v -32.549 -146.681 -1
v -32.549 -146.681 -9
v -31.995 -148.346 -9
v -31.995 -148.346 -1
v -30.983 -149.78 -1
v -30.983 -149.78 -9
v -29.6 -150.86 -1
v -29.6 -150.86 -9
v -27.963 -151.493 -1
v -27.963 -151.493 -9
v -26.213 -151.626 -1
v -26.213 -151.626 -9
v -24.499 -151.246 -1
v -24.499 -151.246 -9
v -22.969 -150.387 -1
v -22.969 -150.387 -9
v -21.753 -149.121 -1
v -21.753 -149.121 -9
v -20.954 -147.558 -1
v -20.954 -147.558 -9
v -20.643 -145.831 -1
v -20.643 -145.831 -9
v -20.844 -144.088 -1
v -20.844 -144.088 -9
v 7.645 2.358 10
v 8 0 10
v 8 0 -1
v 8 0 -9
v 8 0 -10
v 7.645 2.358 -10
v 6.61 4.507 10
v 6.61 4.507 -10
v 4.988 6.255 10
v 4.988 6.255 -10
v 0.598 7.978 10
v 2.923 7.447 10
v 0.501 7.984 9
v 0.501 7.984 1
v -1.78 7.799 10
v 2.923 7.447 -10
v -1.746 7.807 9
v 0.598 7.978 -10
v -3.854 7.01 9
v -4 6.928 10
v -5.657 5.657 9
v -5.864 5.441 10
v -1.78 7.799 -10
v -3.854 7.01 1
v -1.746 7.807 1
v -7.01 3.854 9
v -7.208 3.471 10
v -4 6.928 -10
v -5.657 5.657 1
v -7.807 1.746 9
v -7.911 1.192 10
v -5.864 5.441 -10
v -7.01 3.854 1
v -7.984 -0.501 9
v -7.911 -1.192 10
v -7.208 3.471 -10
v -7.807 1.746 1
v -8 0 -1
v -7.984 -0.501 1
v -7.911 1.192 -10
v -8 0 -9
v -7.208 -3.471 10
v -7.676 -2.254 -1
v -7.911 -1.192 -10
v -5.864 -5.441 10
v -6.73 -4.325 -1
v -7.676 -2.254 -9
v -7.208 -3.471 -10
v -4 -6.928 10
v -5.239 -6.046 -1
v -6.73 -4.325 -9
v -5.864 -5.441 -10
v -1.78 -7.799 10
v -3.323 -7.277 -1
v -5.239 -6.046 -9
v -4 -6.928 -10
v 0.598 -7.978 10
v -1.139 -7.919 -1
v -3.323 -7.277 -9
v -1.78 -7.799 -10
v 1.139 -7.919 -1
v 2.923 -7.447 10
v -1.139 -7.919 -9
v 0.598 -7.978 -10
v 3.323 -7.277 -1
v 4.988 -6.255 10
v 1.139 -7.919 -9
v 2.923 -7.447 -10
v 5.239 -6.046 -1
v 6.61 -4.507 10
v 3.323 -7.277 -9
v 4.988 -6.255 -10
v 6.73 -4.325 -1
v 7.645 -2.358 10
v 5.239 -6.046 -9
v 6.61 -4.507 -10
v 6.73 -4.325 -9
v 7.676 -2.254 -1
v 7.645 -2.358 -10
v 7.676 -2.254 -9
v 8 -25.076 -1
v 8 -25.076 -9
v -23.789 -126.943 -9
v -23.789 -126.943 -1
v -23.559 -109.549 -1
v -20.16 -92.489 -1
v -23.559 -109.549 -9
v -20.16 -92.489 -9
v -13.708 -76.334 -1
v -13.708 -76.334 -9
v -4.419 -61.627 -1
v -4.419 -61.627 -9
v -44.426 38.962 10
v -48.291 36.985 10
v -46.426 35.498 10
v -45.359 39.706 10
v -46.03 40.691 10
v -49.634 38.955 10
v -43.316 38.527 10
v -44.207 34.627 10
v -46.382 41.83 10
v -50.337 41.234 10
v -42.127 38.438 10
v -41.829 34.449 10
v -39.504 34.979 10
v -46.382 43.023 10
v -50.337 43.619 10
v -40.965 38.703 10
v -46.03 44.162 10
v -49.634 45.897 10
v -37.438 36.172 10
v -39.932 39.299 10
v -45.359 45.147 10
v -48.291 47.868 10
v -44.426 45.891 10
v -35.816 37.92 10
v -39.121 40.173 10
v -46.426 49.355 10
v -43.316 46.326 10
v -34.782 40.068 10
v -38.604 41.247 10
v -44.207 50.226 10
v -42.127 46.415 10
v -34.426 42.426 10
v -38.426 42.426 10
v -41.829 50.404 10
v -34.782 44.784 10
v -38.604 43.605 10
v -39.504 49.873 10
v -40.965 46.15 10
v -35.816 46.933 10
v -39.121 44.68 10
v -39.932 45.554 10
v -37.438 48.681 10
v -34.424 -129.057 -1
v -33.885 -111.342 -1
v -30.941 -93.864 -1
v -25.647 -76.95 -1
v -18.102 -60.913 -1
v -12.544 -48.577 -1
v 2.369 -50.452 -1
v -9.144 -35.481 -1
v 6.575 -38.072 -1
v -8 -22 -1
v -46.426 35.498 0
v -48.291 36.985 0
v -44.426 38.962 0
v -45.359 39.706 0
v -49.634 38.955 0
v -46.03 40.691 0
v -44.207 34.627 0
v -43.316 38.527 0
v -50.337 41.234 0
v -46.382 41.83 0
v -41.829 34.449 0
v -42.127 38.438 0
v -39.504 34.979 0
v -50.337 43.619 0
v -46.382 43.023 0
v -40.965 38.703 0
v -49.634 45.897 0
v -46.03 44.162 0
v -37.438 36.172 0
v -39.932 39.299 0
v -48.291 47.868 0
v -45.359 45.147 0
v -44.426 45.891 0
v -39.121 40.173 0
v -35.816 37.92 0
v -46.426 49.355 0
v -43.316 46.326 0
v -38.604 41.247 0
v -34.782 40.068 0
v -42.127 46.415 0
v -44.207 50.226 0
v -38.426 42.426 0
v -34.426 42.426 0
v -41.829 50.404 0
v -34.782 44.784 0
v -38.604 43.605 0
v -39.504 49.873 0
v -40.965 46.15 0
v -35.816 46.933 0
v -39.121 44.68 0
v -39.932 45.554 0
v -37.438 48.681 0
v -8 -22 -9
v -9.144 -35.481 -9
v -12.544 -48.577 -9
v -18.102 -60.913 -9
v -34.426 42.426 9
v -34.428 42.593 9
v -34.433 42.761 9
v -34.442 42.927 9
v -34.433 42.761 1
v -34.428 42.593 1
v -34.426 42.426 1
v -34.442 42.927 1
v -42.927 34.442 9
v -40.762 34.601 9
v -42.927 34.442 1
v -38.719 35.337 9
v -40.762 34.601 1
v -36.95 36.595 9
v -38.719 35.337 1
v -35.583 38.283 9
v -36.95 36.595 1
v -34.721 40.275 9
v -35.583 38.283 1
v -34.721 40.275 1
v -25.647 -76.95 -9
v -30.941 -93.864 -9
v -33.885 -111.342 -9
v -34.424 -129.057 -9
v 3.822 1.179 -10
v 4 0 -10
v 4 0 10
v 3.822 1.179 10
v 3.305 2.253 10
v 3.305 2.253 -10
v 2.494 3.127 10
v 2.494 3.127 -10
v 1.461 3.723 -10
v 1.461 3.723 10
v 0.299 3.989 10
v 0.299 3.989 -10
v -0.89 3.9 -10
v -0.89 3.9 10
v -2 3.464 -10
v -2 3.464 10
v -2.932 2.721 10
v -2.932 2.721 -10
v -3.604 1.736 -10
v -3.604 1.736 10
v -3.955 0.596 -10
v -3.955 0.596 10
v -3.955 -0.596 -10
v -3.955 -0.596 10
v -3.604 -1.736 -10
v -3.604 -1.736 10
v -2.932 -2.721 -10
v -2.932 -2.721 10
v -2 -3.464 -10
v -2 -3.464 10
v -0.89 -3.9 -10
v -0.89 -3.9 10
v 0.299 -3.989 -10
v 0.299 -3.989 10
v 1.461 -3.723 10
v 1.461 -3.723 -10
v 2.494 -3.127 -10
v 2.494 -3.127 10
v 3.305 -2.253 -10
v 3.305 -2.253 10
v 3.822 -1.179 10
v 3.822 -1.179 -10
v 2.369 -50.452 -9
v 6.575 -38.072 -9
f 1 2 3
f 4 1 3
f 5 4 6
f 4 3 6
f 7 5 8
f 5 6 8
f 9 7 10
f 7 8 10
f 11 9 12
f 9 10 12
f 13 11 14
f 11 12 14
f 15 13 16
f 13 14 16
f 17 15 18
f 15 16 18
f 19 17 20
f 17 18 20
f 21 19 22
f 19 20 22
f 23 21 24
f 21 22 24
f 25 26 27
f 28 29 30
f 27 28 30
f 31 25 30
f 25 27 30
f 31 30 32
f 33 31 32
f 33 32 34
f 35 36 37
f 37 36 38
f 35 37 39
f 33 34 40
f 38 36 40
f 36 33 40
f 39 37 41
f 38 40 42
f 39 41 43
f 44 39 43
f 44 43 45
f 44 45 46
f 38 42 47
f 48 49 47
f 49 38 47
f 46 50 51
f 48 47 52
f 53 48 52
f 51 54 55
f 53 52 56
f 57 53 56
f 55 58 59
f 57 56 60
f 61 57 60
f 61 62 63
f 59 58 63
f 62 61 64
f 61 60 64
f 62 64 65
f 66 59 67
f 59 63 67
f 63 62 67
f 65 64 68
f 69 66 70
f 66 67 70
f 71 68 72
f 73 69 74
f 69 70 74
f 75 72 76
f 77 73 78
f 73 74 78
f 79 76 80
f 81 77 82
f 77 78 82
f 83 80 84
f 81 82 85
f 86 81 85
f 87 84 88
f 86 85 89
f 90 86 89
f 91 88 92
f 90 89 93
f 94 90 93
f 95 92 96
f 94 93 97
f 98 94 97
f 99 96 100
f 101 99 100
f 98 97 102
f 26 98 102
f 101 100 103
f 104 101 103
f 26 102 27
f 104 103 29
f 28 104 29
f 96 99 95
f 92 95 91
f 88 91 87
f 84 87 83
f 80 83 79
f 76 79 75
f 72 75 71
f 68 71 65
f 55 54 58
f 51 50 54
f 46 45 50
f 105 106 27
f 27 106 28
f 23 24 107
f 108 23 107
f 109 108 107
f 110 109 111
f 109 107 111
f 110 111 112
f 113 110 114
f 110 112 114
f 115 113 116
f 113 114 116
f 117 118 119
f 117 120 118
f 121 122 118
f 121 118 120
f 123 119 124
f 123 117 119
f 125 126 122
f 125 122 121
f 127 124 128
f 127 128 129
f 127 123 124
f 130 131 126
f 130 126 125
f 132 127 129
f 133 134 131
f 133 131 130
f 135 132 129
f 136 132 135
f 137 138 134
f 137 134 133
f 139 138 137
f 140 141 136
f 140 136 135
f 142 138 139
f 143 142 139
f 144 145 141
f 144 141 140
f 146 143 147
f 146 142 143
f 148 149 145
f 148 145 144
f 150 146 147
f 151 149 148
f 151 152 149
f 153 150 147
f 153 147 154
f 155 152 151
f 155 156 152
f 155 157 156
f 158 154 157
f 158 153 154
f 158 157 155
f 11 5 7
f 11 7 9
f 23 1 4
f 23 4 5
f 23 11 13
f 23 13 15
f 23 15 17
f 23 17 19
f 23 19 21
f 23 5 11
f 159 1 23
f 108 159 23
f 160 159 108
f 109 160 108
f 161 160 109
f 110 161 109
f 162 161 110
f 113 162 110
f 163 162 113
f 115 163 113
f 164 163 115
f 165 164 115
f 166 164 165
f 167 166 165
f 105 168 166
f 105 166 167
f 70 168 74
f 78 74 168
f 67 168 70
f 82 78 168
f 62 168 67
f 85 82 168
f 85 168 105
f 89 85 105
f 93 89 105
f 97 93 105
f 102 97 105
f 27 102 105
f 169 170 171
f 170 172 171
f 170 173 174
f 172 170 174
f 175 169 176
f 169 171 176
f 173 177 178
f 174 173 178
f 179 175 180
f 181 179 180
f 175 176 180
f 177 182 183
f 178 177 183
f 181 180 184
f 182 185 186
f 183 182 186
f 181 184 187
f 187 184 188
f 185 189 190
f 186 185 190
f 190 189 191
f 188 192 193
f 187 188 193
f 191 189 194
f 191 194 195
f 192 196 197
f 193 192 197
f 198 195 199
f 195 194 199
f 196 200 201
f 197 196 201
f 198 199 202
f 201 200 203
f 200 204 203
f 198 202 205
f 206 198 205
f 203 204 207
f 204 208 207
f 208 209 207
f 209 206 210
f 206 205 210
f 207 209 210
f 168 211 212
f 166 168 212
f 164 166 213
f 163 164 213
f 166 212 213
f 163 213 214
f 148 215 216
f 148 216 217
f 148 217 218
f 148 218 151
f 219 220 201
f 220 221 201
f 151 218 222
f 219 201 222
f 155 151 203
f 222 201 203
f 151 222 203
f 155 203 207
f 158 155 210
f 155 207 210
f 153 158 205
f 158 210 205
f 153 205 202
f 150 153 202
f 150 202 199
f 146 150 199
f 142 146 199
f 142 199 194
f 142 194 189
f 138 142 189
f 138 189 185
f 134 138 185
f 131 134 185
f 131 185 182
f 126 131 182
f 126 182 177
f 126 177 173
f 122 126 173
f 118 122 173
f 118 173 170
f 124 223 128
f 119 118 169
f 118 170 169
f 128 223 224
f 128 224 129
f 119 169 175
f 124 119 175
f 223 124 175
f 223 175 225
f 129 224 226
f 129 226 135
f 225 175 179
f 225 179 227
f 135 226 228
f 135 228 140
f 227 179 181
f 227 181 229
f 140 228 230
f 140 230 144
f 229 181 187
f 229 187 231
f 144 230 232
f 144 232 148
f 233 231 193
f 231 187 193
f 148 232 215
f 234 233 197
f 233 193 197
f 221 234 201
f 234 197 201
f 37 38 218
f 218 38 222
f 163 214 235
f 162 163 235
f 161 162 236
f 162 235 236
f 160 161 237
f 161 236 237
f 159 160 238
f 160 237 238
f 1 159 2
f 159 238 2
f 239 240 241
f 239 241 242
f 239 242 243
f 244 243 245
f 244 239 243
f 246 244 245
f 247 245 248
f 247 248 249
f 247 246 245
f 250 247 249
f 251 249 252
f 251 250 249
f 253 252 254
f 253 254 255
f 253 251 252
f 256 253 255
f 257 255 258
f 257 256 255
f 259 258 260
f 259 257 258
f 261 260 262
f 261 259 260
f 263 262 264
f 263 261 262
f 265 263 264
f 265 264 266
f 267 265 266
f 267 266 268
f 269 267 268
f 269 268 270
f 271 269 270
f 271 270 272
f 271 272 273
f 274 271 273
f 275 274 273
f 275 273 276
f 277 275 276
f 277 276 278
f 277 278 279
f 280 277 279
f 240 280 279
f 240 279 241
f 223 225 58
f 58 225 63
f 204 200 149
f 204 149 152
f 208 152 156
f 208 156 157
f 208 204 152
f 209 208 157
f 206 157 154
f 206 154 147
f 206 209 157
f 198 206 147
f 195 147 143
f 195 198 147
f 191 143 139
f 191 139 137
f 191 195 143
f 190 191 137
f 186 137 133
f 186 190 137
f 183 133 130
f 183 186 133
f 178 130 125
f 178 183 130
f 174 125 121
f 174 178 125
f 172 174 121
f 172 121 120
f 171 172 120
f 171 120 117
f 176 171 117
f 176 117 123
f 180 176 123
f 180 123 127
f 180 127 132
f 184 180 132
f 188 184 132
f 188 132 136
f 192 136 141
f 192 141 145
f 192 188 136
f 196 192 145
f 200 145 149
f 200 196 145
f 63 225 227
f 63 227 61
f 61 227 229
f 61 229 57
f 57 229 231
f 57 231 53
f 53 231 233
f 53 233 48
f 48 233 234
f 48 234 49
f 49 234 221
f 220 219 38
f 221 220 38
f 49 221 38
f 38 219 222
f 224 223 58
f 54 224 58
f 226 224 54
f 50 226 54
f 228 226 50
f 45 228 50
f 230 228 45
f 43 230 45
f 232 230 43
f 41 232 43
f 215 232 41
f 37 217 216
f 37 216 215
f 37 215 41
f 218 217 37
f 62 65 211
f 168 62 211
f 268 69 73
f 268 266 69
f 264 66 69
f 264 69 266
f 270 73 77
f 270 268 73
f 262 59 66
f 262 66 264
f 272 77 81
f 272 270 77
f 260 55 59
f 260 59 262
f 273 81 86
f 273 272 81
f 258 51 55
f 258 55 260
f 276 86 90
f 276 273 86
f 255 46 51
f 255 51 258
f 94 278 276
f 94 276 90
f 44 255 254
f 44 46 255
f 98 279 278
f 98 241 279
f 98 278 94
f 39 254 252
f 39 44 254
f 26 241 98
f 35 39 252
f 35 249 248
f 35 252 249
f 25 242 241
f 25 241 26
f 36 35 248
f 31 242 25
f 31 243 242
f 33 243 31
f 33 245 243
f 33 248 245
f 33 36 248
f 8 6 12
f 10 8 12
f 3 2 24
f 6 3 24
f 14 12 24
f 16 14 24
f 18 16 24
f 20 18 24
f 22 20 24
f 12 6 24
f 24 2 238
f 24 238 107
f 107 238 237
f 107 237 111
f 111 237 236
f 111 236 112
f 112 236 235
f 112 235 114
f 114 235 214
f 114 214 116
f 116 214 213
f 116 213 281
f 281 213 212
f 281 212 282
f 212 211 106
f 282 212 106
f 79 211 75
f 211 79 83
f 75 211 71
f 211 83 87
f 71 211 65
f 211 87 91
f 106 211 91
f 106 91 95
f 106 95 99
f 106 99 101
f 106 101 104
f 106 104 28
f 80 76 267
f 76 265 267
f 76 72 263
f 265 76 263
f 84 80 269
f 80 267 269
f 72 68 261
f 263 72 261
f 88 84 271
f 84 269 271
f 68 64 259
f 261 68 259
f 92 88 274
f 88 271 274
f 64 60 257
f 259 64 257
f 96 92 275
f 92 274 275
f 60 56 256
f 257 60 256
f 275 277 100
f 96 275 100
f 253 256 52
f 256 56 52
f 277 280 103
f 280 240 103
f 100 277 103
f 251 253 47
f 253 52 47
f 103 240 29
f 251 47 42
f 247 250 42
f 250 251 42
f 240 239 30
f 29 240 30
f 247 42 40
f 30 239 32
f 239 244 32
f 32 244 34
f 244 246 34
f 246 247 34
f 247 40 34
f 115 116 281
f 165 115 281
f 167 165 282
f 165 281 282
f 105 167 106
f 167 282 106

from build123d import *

# Parameters (mm, degrees)
SKETCH_1_R        = 8
SKETCH_1_R_2      = 4
EXTRUDE_1_DEPTH   = 10
EXTRUDE_1_2_DEPTH = 10
EXTRUDE_START     = 1
EXTRUDE_2_DEPTH   = 8
EXTRUDE_START_2   = -9
EXTRUDE_3_DEPTH   = 8
EXTRUDE_START_3   = -10
SKETCH_4_R        = 8
SKETCH_4_R_2      = 4
EXTRUDE_4_DEPTH   = 10


with BuildPart() as part:
    # 草图1 → 凸台-拉伸1 (new body)
    with BuildSketch(Plane.XY):
        Circle(SKETCH_1_R)
        Circle(SKETCH_1_R_2, mode=Mode.SUBTRACT)
    extrude(amount=EXTRUDE_1_DEPTH)



with BuildPart() as body_2:
    # 草图1 → Extrude 1 2 (new body)
    with BuildSketch(Plane.XY):
        with Locations((-42.426406871, 42.426406871)):
            Circle(SKETCH_1_R)
        with Locations((-42.426406871, 42.426406871)):
            Circle(SKETCH_1_R_2, mode=Mode.SUBTRACT)
    extrude(amount=EXTRUDE_1_2_DEPTH)


with BuildPart() as part_1:
    add(part.part)

    add(body_2.part)  # 凸台-拉伸2 merges body 2
    # 草图2 → 凸台-拉伸2 (add)
    with BuildSketch(Plane.XY.offset(EXTRUDE_START)):
        with BuildLine():
            Line((-42.927390172, 34.442108797), (-7.984298074, -0.5009833))
            ThreePointArc((-7.984298074, -0.5009833), (-5.656854249, 5.656854249), (0.5009833, 7.984298074))
            Line((0.5009833, 7.984298074), (-34.442108797, 42.927390172))
            ThreePointArc((-34.442108797, 42.927390172), (-36.769552622, 36.769552622), (-42.927390172, 34.442108797))
        make_face()
    extrude(amount=EXTRUDE_2_DEPTH)



with BuildPart() as body_2_2:
    # 草图3 → 凸台-拉伸3 (new body)
    with BuildSketch(Plane.XY.offset(EXTRUDE_START_2)):
        with BuildLine():
            Line((-8, 0), (-8, -22))
            ThreePointArc((-8, -22), (-10.566583087, -42.101391623), (-18.101648629, -60.912985951))
            ThreePointArc((-18.101648629, -60.912985951), (-32.710853992, -102.552801732), (-32.548897818, -146.680762367))
            ThreePointArc((-32.548897818, -146.680762367), (-25.342004787, -151.498702844), (-20.844170391, -144.087809285))
            ThreePointArc((-20.844170391, -144.087809285), (-22.250809754, -100.941256341), (-4.418535572, -61.626962976))
            ThreePointArc((-4.418535572, -61.626962976), (4.810597012, -44.37728268), (8, -25.075571172))
            Line((8, -25.075571172), (8, 0))
            ThreePointArc((8, 0), (0, -8), (-8, 0))
        make_face()
    extrude(amount=EXTRUDE_3_DEPTH)


with BuildPart() as part_2:
    add(part_1.part)

    add(body_2_2.part)  # 凸台-拉伸4 merges body 2 2
    # 草图4 → 凸台-拉伸4 (add)
    with BuildSketch(Plane.XY.offset(EXTRUDE_START_3)):
        Circle(SKETCH_4_R)
        Circle(SKETCH_4_R_2, mode=Mode.SUBTRACT)
    extrude(amount=EXTRUDE_4_DEPTH)


solid = part_2.part
